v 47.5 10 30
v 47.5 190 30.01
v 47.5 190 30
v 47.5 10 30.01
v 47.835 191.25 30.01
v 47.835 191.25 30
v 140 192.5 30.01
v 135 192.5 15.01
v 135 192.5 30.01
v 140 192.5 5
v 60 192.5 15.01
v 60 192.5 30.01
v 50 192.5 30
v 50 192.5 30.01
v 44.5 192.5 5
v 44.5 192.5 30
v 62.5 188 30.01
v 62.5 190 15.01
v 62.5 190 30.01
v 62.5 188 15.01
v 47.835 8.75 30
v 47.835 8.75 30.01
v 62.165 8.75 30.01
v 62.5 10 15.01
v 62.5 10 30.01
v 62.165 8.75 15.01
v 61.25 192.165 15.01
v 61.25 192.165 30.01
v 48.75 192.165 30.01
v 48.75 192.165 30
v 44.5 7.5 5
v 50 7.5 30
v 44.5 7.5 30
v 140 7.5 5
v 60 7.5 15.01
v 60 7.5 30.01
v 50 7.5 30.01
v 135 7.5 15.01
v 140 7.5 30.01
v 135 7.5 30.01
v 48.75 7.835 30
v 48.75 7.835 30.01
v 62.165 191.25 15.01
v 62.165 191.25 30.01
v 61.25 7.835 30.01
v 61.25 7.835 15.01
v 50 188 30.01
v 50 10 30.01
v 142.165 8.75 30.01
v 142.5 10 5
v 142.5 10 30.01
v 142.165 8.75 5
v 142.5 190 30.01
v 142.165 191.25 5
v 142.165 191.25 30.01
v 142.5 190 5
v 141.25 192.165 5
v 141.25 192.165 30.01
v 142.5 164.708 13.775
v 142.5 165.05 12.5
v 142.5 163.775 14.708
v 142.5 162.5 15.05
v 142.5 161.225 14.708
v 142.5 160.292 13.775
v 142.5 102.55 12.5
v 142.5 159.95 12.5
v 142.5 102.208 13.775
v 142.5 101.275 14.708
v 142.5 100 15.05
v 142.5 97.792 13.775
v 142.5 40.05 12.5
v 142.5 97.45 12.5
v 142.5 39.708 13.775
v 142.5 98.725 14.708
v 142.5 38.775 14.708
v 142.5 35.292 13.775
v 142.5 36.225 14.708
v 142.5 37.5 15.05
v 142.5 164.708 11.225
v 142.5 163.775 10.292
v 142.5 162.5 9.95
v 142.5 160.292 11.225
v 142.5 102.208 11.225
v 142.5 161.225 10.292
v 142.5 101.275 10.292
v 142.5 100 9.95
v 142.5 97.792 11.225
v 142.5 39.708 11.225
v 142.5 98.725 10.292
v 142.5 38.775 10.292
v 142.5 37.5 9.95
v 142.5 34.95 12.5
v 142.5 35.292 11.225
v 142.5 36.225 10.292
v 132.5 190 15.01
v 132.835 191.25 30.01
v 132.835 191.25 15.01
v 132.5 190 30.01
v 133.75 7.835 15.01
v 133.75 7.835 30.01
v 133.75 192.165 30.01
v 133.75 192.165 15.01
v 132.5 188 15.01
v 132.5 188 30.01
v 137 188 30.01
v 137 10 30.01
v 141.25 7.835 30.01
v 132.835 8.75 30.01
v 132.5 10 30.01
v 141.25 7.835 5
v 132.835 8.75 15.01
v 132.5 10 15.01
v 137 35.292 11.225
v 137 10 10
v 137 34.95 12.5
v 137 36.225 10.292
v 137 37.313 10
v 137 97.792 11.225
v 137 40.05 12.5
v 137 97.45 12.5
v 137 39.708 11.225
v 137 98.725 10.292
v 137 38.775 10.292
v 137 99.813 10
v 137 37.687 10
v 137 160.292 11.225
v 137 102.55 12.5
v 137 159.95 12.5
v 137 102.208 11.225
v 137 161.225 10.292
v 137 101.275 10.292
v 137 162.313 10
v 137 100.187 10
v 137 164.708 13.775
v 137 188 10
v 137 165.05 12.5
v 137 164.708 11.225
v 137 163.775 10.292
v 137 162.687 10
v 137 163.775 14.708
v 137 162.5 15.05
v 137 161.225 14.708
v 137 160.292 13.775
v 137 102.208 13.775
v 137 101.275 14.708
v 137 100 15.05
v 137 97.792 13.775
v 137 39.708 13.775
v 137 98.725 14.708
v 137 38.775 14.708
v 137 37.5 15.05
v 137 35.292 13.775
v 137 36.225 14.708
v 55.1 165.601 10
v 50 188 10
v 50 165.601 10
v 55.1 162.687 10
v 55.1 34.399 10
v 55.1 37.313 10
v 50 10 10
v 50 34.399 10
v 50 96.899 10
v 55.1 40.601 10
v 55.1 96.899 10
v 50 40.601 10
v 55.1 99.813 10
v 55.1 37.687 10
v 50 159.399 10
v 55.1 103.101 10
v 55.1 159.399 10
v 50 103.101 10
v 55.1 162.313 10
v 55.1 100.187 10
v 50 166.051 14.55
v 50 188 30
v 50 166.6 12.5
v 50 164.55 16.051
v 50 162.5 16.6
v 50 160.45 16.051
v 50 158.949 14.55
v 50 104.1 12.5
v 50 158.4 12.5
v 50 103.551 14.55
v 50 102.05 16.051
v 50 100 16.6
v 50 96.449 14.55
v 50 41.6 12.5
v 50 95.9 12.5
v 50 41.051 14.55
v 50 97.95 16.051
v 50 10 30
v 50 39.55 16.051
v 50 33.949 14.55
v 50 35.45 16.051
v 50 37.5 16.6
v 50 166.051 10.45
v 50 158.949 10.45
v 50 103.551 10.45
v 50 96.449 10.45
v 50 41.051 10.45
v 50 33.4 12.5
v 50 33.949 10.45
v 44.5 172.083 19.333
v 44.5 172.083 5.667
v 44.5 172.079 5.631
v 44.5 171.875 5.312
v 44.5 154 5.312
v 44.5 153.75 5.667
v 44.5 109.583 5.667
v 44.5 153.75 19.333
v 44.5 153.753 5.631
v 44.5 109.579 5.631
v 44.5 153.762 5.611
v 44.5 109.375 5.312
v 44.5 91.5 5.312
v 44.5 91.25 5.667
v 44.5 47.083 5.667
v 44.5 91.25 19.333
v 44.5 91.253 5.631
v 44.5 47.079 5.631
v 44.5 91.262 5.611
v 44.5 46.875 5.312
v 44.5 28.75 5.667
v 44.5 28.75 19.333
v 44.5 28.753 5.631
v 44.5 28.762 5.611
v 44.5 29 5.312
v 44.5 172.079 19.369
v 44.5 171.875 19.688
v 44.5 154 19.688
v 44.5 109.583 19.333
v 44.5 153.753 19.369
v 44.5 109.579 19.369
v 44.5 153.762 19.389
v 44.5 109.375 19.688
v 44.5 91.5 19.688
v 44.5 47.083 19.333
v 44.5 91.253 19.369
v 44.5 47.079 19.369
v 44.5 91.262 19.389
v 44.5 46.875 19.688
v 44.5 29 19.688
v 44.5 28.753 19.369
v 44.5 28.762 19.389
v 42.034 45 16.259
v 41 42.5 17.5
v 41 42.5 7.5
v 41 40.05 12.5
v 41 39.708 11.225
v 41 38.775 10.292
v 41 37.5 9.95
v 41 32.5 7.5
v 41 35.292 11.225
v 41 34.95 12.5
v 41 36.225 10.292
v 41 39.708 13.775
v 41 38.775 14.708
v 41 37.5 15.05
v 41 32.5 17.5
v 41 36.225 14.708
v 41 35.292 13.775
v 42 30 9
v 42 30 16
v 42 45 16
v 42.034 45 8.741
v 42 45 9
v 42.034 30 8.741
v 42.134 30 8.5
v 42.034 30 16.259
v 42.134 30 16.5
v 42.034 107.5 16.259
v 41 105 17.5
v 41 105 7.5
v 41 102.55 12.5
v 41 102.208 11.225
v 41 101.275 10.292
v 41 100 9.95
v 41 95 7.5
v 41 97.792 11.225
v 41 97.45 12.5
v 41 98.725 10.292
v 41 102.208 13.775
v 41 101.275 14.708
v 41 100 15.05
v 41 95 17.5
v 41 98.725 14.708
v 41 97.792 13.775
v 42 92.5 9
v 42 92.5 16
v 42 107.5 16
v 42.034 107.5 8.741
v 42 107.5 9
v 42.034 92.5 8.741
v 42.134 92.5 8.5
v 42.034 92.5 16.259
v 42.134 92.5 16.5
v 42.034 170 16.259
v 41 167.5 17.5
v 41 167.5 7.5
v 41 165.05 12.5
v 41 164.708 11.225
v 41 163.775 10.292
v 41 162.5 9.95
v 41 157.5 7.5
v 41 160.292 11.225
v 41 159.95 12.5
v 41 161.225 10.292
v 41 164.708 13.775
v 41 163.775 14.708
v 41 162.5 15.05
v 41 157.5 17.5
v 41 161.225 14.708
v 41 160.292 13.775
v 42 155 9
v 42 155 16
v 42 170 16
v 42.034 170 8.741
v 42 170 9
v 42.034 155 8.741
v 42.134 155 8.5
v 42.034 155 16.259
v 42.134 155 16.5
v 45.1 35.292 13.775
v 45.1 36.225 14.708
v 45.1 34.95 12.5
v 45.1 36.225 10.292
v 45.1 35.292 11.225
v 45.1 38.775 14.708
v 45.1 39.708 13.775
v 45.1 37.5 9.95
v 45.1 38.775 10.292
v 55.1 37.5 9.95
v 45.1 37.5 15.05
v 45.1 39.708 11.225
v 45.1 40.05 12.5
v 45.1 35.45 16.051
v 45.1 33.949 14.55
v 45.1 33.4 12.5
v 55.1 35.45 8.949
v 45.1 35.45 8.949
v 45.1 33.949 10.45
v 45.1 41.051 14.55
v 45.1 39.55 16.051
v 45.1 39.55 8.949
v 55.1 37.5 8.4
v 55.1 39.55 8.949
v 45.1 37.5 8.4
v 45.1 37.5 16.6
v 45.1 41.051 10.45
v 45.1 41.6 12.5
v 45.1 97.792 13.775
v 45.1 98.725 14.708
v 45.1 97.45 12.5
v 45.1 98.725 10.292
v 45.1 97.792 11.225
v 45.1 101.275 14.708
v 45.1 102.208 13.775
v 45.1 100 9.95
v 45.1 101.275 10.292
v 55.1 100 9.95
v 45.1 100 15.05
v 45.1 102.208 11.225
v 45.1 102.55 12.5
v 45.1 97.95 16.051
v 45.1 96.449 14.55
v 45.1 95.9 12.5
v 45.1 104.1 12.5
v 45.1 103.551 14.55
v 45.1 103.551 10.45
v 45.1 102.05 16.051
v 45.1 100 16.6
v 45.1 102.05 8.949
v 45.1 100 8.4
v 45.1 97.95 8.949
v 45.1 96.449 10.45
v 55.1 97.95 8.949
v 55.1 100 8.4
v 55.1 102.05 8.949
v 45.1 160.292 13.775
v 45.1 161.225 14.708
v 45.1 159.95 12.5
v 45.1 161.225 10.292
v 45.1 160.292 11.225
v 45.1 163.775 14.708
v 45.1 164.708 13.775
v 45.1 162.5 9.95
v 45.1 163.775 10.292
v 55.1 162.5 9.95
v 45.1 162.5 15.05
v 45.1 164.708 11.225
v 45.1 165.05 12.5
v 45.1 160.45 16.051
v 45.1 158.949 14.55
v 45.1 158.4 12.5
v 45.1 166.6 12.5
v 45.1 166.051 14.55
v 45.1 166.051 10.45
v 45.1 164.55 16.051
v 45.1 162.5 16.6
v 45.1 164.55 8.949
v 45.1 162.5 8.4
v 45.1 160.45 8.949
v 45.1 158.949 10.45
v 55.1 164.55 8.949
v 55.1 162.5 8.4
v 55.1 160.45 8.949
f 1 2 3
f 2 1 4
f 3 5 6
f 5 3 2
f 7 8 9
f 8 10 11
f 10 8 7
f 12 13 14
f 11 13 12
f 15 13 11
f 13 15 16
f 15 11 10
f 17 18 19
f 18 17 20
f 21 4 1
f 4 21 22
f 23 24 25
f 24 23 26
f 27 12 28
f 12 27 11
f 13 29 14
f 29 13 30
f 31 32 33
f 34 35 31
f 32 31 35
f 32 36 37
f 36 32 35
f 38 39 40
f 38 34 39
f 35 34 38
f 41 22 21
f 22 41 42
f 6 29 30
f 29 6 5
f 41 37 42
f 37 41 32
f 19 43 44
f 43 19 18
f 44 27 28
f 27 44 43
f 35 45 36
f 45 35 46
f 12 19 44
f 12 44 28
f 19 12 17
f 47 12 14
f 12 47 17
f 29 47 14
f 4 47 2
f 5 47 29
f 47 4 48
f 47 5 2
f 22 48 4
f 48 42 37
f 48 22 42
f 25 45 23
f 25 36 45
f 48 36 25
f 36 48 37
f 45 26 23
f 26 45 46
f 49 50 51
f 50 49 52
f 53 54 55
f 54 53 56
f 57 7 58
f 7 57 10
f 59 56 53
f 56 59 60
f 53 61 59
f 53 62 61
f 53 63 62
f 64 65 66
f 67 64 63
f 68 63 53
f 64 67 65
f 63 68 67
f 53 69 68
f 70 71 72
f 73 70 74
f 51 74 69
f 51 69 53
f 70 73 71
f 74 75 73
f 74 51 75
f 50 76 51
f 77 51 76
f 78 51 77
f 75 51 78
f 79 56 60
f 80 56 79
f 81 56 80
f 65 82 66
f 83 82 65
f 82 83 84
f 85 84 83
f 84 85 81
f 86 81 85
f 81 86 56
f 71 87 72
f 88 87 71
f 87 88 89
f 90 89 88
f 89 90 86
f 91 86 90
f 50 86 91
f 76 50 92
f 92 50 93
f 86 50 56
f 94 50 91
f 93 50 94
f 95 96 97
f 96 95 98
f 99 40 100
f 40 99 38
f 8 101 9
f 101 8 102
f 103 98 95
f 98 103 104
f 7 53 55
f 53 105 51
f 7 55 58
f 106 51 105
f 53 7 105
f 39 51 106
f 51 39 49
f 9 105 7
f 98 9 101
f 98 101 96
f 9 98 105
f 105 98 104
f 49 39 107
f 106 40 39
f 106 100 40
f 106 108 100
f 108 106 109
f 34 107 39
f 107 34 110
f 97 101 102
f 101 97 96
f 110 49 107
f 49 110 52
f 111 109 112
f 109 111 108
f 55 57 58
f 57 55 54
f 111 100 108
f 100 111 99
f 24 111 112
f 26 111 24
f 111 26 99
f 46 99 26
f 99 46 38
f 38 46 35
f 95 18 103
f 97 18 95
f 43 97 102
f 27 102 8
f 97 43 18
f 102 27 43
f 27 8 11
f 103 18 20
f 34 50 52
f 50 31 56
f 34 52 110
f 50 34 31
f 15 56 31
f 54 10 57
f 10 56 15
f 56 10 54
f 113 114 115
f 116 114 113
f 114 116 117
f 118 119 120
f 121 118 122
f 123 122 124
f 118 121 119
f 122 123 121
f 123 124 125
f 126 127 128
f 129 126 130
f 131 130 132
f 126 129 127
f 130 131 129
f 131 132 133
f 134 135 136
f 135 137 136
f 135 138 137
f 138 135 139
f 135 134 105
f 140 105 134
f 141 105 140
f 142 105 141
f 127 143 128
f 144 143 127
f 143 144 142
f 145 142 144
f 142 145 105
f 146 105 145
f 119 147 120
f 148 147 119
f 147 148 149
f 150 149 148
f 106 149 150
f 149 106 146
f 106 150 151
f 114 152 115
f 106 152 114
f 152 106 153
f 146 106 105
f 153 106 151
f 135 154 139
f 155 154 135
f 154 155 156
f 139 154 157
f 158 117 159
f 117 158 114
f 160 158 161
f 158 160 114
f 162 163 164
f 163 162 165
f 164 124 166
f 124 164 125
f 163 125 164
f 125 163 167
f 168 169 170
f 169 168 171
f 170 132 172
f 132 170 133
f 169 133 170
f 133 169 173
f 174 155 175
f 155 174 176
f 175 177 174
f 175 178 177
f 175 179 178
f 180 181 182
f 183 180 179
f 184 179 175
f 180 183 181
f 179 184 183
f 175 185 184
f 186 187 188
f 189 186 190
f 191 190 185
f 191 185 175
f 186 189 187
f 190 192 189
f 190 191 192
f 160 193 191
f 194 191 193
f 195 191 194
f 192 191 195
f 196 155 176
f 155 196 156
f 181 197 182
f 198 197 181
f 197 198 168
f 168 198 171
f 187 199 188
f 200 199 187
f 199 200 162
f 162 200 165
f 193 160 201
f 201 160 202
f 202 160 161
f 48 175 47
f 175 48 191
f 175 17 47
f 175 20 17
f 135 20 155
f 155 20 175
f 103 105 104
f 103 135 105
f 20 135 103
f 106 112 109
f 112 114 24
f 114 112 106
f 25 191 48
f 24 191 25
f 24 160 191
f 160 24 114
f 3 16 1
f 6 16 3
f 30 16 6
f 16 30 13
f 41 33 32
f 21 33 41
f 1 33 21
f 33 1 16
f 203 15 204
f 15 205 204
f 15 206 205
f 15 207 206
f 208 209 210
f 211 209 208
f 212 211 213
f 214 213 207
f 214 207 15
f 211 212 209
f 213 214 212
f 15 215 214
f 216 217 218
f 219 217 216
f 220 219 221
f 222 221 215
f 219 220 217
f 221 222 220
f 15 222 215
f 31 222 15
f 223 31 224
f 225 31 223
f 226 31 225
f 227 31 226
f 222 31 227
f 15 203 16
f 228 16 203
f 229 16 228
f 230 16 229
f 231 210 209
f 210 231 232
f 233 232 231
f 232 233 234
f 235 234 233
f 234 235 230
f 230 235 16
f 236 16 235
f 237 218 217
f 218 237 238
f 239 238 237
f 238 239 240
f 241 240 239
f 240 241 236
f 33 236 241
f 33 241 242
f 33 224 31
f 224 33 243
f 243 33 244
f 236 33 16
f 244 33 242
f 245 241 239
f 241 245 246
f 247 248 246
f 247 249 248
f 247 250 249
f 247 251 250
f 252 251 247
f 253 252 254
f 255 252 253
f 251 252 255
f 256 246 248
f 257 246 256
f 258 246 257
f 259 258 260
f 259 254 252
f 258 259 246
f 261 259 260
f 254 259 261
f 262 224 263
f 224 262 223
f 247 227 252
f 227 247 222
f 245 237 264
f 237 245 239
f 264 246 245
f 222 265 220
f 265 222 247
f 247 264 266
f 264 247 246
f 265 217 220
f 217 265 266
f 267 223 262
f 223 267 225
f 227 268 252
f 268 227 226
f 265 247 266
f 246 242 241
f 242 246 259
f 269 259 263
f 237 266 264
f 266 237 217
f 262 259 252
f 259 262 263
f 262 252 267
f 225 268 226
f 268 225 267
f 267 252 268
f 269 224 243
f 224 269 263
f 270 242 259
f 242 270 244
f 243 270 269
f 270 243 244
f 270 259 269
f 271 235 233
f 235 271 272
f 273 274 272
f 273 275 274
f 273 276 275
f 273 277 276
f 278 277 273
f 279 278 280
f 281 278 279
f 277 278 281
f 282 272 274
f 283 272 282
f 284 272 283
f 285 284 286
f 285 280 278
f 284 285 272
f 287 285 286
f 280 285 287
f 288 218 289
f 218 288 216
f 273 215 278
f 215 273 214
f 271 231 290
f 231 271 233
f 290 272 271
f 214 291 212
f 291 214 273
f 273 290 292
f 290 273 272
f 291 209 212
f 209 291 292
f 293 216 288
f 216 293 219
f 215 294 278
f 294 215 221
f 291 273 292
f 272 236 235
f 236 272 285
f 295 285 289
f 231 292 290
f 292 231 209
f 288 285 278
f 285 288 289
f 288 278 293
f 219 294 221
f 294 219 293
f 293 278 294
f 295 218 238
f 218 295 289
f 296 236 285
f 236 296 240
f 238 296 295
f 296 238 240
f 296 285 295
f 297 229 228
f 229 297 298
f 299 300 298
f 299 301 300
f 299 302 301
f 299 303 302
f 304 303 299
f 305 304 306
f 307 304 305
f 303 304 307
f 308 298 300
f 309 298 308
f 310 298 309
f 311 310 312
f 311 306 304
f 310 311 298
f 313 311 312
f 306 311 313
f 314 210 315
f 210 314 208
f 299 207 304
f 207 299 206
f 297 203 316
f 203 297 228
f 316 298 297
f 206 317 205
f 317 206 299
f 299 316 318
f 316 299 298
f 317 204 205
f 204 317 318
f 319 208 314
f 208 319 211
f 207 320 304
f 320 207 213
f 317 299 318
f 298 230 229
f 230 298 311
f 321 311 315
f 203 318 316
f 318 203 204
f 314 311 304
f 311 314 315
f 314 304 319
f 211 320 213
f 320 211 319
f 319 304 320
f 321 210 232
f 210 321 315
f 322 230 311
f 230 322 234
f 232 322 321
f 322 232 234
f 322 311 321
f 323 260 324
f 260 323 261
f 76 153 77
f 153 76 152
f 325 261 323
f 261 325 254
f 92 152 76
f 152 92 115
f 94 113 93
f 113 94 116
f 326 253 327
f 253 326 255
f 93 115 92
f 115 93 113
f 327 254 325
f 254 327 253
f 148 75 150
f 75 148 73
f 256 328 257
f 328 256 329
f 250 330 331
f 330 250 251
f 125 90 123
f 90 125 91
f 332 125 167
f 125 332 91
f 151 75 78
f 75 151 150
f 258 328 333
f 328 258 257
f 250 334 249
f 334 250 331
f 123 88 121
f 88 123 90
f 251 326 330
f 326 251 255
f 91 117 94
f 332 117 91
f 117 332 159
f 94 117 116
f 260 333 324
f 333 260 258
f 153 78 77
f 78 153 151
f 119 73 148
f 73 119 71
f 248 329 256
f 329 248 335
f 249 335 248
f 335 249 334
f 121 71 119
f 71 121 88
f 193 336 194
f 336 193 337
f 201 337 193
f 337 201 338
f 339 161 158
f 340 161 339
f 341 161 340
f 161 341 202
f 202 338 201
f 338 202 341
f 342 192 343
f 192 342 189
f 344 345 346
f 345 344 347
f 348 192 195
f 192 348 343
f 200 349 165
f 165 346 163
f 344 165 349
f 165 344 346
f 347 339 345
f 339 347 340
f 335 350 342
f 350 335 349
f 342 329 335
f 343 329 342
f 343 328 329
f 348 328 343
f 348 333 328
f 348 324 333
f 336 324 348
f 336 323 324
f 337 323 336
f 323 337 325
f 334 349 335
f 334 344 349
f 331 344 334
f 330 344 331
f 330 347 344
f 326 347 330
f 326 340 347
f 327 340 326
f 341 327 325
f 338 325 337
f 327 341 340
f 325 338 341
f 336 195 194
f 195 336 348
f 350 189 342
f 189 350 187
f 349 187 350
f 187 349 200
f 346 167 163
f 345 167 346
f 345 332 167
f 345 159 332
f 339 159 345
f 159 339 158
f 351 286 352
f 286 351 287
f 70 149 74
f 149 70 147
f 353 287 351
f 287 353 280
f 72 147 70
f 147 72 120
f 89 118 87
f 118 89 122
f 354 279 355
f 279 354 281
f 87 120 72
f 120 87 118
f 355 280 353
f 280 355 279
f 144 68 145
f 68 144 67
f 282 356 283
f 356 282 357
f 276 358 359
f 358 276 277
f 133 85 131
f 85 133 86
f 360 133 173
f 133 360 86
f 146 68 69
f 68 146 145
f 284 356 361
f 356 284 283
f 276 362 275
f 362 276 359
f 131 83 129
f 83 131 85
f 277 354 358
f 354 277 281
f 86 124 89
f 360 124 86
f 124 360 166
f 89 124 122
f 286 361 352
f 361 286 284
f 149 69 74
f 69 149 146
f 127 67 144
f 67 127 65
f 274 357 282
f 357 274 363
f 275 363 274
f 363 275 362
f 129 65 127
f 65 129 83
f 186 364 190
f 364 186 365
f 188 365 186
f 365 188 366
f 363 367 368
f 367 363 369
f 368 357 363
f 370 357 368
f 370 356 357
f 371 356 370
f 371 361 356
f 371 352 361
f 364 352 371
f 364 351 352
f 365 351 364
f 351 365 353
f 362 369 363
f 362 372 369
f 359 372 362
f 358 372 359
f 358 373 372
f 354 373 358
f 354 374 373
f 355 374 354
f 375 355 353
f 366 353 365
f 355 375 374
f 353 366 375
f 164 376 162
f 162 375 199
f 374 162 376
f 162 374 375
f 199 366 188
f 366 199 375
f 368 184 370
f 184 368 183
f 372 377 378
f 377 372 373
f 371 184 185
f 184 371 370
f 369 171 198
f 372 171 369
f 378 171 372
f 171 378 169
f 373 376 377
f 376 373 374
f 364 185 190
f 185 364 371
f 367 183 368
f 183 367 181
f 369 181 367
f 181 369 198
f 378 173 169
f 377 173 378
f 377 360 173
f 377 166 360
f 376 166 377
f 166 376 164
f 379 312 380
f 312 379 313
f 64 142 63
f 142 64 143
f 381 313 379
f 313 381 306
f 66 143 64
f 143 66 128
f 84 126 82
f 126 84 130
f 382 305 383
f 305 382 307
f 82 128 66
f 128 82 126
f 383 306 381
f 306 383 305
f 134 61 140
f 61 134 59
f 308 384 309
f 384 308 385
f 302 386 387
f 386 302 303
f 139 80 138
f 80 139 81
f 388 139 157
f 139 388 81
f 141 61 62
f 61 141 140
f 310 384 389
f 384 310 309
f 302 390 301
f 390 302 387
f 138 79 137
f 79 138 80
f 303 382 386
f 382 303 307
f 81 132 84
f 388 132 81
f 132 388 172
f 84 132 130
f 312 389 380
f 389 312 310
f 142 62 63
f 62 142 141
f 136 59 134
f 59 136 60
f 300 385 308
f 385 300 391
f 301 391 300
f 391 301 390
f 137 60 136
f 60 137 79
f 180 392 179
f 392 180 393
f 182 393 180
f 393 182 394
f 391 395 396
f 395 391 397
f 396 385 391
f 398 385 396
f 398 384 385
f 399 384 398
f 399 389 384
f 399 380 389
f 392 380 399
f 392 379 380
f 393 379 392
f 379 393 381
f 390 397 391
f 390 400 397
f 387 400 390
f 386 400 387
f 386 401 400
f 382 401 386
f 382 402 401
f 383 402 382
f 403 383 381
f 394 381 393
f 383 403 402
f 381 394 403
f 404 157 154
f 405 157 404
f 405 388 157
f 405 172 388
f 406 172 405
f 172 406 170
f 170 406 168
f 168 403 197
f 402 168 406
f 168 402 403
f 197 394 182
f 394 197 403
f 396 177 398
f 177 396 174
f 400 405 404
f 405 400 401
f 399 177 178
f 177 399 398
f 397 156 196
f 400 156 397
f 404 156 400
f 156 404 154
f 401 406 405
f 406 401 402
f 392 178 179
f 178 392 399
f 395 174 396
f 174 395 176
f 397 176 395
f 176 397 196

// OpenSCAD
// file: ../functions.scad
// PRUSA Mendel  
// Functions used in many files
// GNU GPL v2
// Josef Průša
// josefprusa@me.com
// prusadjs.cz
// http://www.reprap.org/wiki/Prusa_Mendel
// http://github.com/prusajr/PrusaMendel

module nut(d,h,horizontal=true){
cornerdiameter =  (d / 2) / cos (180 / 6);
cylinder(h = h, r = cornerdiameter, $fn = 6);
if(horizontal){
for(i = [1:6]){
	rotate([0,0,60*i]) translate([-cornerdiameter-0.2,0,0]) rotate([0,0,-45]) cube(size = [2,2,h]);
}}
}

// By nophead
module polyhole(d,h) {
    n = max(round(2 * d),3);
    rotate([0,0,180])
        cylinder(h = h, r = (d / 2) / cos (180 / n), $fn = n);
}

module roundcorner(diameter){
	difference(){
		cube(size = [diameter,diameter,99], center = false);
		translate(v = [diameter, diameter, 0]) cylinder(h = 100, r=diameter, center=true);
	}
}
// file: ../metric.scad
// PRUSA Mendel  
// Default metric sizes
// GNU GPL v2
// Josef Průša
// josefprusa@me.com
// prusadjs.cz
// http://www.reprap.org/wiki/Prusa_Mendel
// http://github.com/prusajr/PrusaMendel

// DONT CHANGE THIS FILE! ALTER VALUES IN CONFIGURATION.SCAD INSTEAD

// RODS

threaded_rod_diameter = 8;
threaded_rod_diameter_horizontal = 8;
smooth_bar_diameter = 8;
smooth_bar_diameter_horizontal = 8;

// Nuts and bolts

m8_diameter = 8;
m8_nut_diameter = 14.5;

m4_diameter = 4;
m4_nut_diameter = 7.5;

m3_diameter = 3;
m3_nut_diameter = 5;

// Bushing holder

bushing_core_diameter = smooth_bar_diameter;
bushing_material_thickness = 1;

// Motors

motor_shaft = 5.1;
// file: ../configuration.scad
// PRUSA Mendel  
// Configuration file
// GNU GPL v2
// Josef Průša
// josefprusa@me.com
// prusadjs.cz
// http://www.reprap.org/wiki/Prusa_Mendel
// http://github.com/prusajr/PrusaMendel

// PLEASE SELECT ONE OF THE CONFIGURATIONS BELOW
// BY UN-COMMENTING IT

// Uncomment for metric settings
// METRIC METRIC METRIC METRIC METRIC METRIC METRIC METRIC 

include <metric.scad>;

// Uncomment for imperial settings
// IMPERIAL IMPERIAL IMPERIAL IMPERIAL IMPERIAL IMPERIAL IMPERIAL 

//include <sae.scad>;

//thin_wall = 3;
// LM8UU
//linear = false;

// override settings by customizing below
// CUSTOM CUSTOM CUSTOM CUSTOM CUSTOM CUSTOM CUSTOM CUSTOM CUSTOM

threaded_rod_diameter = 8.2;
threaded_rod_diameter_horizontal = 8.2;
smooth_bar_diameter = 8.3;
smooth_bar_diameter_horizontal = 8.3;

// Nuts and bolts

m8_diameter = 8.3;
m8_nut_diameter = 15;

m4_diameter = 4.2;
m4_nut_diameter = 9;

m3_diameter = 3.3;
m3_nut_diameter = 5.8;

///counted stuff
m3_nut_diameter_bigger = ((m3_nut_diameter  / 2) / cos (180 / 6))*2;

// functions 
include <functions.scad>
// file: ../../moreparts/terawatt-pro-power/src/mnt_psu.scad
/*
	3D Power Supply Mount
	by Free Beachler of Terawatt Industries

This work is licensed under the Creative Commons Attribution-ShareAlike 3.0 Unported License. To view a copy of this license, visit http://creativecommons.org/licenses/by-sa/3.0/.
*/

//Round corner diameter
round_corner_diameter = 8;

m5_diameter = 5.5;
m5_nut_diameter = 9.5;
m5_cap_diameter = 8.5;
m4_diameter = 4.5;
m4_nut_diameter = 7.5;
m3_diameter = 3.2;
m3_nut_diameter = 5.3;

power_mount();
// power supply
//% color([0.1, 0.9, 0]) translate([0, 2.5, 10]) cube([85, 175, 70]);

module power_mount(sd = m5_diameter, cd = m5_cap_diameter, m3 = m3_diameter) {
	difference() {
		union() {
			platform();
			translate([0, 25 + 5 + 2.5, 17]) rotate([0, 0, 90]) mount_arm_m3(0, 0, 0, 0.1, 2, m3);
			translate([0, 87.5 + 5 + 2.5, 17]) rotate([0, 0, 90]) mount_arm_m3(0, 0, 0, 0.1, 2);
			translate([0, 150 + 5 + 2.5, 17]) rotate([0, 0, 90]) mount_arm_m3(0, 0, 0, 0.1, 2, m3);
		}
		translate([0, 2.5, 2.5]) mount_holes(sd, cd);
	}
}

module platform() {
	difference() {
		// round some corners
		translate([0, 0, 5]) minkowski() {
			difference() {
				cube([90, 180, 25]);
				translate([10, -5.1, 10]) cube([75, 205.2, 70]);
			}
			cylinder(r=2.5, h=0.01, center=false, $fn=12);
			//	rotate([0, 90, 0]) cylinder(r=2.5, h=0.01, center=false, $fn=12);
		}
		translate([0, 0, 10]) cube([87, 178, 75]);
	}
	// square the mount plate area
	translate([-5.5, -2.5, 5]) cube([5.5, 185, 25]);
	//	translate([-9.5, 5, 0]) cube([97.5, 185, 5]);
}

module mount_holes(sd, cd) {
	for (i = [25, 87.5, 150]) {
		rotate([0, 90, 0]) translate([-10, i, -20]) cylinder(r=sd / 2, h=150, center = false, $fn=12);
		rotate([0, 90, 0]) translate([-10, i, -4.9]) cylinder(r=cd / 2, h=10, center = false, $fn=12);
	}
}


module mount_arm_m3(h, w, d, tol, wt, m3) {
	for (z = [d - wt - 5 + 3.5]) {
		// trapezoid block
		difference() { 
			hull() {
				hull() {
					translate([h - 10, w + 4, z - 6]) cube([10, 5, 10], center = false);
					translate([h + 5, w, z + 6.5]) rotate([0, 90, 90]) cube([15, 15 + wt * 2, 5], center = false);
				}
				// rounded block
				translate([h - 12.5, w + wt + 1.5 + 3.5, z + 2.5]) rotate([90, 0, 90]) cylinder(r = 1, h = 15, center = false, $fn = 24);
				translate([h - 12.5, w + wt + 1.5 + 3.5, z - 7 + 2.5]) rotate([90, 0, 90]) cylinder(r = 1, h = 15, center = false, $fn = 24);
			}
			// M3 mount hole
			translate([h - 5, w * 2, z - 3.5 + 2.5]) rotate([90, 0, 0]) cylinder(r = m3 / 2, h = d * 2, center = false, $fn = 24);
		}
	}
}
// file: heatbed.scad
// F. Beachler, Longevity Software LLC. d.b.a. Terawatt Industries

include <../configuration.scad>;

$fn=50;
height = 200;
width = 200;
depth = 3;

heatbed(height, width, depth);

module heatbed(h = height, w = width, t = depth) {
	color([255, 0, 0]) cube([h, w, t]);
}
// main file
// F. Beachler, Longevity Software LLC. d.b.a. Terawatt Industries

use <heatbed.scad>;
use <../../moreparts/terawatt-pro-power/src/mnt_psu.scad>;

$fn=50;

% translate([0, 0, -3]) heatbed();
plate1();

module plate1() {
	translate([50, 10, 0]) power_mount(5.1, 8.2, 3.2);
}
